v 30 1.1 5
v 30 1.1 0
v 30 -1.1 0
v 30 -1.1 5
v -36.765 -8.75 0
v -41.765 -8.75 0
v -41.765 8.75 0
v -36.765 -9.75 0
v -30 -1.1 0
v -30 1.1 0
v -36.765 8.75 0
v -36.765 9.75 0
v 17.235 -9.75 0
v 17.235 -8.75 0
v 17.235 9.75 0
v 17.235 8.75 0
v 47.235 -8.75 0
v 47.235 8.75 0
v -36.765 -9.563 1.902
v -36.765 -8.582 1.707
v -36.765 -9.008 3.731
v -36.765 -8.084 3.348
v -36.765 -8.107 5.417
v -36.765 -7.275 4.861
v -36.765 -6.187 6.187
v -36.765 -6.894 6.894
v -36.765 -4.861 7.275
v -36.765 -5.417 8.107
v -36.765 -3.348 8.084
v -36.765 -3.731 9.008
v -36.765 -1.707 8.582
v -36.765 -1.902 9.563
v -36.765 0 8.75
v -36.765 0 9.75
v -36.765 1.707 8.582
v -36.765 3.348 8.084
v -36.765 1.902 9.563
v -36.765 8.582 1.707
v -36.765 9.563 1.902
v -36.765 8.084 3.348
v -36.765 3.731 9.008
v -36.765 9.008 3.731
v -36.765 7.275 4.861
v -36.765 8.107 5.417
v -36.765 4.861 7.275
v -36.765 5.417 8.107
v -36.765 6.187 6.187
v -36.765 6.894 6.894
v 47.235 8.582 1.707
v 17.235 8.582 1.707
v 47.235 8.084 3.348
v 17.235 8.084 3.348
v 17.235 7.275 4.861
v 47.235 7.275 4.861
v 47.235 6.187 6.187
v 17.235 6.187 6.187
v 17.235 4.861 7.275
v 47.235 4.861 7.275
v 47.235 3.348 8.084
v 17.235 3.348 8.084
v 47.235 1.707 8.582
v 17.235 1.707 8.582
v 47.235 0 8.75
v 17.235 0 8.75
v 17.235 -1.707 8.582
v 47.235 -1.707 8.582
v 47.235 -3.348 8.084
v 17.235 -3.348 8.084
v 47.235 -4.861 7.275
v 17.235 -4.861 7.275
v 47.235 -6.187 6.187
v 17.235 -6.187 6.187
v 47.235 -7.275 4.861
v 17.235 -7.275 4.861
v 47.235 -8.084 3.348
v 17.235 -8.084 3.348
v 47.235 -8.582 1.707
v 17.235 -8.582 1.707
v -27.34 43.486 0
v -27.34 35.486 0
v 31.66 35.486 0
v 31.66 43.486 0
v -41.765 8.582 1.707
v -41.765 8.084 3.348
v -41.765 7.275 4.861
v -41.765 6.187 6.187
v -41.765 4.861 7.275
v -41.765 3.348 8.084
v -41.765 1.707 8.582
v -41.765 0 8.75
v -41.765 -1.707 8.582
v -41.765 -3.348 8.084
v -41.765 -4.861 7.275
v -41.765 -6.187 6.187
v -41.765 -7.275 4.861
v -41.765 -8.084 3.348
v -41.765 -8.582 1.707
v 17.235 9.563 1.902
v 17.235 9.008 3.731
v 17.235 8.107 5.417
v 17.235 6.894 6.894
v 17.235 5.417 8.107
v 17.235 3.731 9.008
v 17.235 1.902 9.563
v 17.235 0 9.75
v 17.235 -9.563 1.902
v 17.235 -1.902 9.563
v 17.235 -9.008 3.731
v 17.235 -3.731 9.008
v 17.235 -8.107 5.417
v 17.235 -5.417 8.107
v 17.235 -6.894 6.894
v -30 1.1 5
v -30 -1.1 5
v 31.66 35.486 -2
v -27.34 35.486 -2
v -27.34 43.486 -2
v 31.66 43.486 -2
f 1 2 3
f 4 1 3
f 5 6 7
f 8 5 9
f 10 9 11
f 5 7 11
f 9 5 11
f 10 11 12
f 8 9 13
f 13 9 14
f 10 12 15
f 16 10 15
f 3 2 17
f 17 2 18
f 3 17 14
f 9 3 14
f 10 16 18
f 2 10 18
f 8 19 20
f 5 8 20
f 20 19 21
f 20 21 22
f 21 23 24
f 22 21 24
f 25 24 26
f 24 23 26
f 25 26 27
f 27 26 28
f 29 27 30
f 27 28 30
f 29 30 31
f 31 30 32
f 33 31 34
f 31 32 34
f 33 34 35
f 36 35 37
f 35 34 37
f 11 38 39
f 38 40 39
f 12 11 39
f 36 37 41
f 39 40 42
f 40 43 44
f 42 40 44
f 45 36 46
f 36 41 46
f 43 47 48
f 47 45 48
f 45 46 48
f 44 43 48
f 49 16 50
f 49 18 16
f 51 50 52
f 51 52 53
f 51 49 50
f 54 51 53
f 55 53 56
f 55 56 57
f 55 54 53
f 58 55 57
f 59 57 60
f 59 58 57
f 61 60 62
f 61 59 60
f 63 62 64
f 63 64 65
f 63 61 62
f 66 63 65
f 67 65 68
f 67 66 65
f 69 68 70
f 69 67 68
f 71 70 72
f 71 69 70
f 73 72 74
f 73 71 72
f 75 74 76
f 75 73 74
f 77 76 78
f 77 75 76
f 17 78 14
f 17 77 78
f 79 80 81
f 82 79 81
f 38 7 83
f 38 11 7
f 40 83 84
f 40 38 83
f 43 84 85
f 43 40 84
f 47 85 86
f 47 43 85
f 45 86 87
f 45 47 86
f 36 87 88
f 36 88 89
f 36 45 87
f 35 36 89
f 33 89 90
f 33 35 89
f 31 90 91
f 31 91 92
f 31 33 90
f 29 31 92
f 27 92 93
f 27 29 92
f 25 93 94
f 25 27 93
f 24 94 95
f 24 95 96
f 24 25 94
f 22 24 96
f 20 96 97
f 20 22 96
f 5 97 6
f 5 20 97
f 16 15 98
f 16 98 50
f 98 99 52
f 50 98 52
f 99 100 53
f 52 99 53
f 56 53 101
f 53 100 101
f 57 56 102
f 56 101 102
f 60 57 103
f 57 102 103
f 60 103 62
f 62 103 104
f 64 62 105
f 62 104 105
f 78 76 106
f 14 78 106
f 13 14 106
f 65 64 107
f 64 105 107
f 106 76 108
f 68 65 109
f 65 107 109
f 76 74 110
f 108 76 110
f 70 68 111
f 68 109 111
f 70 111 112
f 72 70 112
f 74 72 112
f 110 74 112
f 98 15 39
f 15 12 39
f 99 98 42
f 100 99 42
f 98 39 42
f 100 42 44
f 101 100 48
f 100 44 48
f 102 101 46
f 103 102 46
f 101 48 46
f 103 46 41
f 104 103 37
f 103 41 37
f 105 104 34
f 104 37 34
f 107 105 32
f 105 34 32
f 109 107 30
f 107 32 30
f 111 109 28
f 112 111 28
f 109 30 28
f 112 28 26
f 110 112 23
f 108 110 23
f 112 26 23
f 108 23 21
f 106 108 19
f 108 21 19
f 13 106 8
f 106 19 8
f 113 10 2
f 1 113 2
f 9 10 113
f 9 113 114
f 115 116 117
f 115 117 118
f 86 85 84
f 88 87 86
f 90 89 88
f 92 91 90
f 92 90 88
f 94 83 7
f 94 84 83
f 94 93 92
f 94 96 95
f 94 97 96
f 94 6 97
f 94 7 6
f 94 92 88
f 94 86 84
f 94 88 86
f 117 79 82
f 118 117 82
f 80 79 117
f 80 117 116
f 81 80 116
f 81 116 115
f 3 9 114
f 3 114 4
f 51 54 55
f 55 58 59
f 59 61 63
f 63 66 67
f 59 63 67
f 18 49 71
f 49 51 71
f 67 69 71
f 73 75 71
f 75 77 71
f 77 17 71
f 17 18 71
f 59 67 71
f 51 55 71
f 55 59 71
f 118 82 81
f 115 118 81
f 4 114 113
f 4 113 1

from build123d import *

# Parameters (mm, degrees)
F0_W     = 5
F0_H     = 8.75
F0_W_2   = 30
F1_ANGLE = 180
F2_W     = 60
F2_H     = 2.2
F3_DEPTH = 5
F2_W_2   = 59
F2_H_2   = 8
F4_DEPTH = 2


with BuildPart() as f1:
    # F0 (on Top) → F1 (revolve)
    with BuildSketch(Plane.XY):
        with Locations((-39.26535, 4.375)):
            Rectangle(F0_W, F0_H)
        Polygon((-36.76535, 8.75), (-36.76535, 0), (17.23465, 0), (17.23465, 8.75), (17.23465, 9.75), (-36.76535, 9.75), align=None)
        with Locations((32.23465, 4.375)):
            Rectangle(F0_W_2, F0_H)
    revolve(axis=Axis((-9.76535, 0, 0), (1, 0, 0)), revolution_arc=F1_ANGLE)

    # F2 (on face) → F3 (cut)
    with BuildSketch(Plane(origin=(0, 0, 0), x_dir=(1, 0, 0), z_dir=(0, 0, -1))):
        Rectangle(F2_W, F2_H)
    extrude(amount=-F3_DEPTH, mode=Mode.SUBTRACT)


with BuildPart() as f4:
    # F2 (on face) → F4 (new body)
    with BuildSketch(Plane(origin=(0, 0, 0), x_dir=(1, 0, 0), z_dir=(0, 0, -1))):
        with Locations((2.160374, -39.485849)):
            Rectangle(F2_W_2, F2_H_2)
    extrude(amount=F4_DEPTH)


solid = Compound([f1.part, f4.part])
